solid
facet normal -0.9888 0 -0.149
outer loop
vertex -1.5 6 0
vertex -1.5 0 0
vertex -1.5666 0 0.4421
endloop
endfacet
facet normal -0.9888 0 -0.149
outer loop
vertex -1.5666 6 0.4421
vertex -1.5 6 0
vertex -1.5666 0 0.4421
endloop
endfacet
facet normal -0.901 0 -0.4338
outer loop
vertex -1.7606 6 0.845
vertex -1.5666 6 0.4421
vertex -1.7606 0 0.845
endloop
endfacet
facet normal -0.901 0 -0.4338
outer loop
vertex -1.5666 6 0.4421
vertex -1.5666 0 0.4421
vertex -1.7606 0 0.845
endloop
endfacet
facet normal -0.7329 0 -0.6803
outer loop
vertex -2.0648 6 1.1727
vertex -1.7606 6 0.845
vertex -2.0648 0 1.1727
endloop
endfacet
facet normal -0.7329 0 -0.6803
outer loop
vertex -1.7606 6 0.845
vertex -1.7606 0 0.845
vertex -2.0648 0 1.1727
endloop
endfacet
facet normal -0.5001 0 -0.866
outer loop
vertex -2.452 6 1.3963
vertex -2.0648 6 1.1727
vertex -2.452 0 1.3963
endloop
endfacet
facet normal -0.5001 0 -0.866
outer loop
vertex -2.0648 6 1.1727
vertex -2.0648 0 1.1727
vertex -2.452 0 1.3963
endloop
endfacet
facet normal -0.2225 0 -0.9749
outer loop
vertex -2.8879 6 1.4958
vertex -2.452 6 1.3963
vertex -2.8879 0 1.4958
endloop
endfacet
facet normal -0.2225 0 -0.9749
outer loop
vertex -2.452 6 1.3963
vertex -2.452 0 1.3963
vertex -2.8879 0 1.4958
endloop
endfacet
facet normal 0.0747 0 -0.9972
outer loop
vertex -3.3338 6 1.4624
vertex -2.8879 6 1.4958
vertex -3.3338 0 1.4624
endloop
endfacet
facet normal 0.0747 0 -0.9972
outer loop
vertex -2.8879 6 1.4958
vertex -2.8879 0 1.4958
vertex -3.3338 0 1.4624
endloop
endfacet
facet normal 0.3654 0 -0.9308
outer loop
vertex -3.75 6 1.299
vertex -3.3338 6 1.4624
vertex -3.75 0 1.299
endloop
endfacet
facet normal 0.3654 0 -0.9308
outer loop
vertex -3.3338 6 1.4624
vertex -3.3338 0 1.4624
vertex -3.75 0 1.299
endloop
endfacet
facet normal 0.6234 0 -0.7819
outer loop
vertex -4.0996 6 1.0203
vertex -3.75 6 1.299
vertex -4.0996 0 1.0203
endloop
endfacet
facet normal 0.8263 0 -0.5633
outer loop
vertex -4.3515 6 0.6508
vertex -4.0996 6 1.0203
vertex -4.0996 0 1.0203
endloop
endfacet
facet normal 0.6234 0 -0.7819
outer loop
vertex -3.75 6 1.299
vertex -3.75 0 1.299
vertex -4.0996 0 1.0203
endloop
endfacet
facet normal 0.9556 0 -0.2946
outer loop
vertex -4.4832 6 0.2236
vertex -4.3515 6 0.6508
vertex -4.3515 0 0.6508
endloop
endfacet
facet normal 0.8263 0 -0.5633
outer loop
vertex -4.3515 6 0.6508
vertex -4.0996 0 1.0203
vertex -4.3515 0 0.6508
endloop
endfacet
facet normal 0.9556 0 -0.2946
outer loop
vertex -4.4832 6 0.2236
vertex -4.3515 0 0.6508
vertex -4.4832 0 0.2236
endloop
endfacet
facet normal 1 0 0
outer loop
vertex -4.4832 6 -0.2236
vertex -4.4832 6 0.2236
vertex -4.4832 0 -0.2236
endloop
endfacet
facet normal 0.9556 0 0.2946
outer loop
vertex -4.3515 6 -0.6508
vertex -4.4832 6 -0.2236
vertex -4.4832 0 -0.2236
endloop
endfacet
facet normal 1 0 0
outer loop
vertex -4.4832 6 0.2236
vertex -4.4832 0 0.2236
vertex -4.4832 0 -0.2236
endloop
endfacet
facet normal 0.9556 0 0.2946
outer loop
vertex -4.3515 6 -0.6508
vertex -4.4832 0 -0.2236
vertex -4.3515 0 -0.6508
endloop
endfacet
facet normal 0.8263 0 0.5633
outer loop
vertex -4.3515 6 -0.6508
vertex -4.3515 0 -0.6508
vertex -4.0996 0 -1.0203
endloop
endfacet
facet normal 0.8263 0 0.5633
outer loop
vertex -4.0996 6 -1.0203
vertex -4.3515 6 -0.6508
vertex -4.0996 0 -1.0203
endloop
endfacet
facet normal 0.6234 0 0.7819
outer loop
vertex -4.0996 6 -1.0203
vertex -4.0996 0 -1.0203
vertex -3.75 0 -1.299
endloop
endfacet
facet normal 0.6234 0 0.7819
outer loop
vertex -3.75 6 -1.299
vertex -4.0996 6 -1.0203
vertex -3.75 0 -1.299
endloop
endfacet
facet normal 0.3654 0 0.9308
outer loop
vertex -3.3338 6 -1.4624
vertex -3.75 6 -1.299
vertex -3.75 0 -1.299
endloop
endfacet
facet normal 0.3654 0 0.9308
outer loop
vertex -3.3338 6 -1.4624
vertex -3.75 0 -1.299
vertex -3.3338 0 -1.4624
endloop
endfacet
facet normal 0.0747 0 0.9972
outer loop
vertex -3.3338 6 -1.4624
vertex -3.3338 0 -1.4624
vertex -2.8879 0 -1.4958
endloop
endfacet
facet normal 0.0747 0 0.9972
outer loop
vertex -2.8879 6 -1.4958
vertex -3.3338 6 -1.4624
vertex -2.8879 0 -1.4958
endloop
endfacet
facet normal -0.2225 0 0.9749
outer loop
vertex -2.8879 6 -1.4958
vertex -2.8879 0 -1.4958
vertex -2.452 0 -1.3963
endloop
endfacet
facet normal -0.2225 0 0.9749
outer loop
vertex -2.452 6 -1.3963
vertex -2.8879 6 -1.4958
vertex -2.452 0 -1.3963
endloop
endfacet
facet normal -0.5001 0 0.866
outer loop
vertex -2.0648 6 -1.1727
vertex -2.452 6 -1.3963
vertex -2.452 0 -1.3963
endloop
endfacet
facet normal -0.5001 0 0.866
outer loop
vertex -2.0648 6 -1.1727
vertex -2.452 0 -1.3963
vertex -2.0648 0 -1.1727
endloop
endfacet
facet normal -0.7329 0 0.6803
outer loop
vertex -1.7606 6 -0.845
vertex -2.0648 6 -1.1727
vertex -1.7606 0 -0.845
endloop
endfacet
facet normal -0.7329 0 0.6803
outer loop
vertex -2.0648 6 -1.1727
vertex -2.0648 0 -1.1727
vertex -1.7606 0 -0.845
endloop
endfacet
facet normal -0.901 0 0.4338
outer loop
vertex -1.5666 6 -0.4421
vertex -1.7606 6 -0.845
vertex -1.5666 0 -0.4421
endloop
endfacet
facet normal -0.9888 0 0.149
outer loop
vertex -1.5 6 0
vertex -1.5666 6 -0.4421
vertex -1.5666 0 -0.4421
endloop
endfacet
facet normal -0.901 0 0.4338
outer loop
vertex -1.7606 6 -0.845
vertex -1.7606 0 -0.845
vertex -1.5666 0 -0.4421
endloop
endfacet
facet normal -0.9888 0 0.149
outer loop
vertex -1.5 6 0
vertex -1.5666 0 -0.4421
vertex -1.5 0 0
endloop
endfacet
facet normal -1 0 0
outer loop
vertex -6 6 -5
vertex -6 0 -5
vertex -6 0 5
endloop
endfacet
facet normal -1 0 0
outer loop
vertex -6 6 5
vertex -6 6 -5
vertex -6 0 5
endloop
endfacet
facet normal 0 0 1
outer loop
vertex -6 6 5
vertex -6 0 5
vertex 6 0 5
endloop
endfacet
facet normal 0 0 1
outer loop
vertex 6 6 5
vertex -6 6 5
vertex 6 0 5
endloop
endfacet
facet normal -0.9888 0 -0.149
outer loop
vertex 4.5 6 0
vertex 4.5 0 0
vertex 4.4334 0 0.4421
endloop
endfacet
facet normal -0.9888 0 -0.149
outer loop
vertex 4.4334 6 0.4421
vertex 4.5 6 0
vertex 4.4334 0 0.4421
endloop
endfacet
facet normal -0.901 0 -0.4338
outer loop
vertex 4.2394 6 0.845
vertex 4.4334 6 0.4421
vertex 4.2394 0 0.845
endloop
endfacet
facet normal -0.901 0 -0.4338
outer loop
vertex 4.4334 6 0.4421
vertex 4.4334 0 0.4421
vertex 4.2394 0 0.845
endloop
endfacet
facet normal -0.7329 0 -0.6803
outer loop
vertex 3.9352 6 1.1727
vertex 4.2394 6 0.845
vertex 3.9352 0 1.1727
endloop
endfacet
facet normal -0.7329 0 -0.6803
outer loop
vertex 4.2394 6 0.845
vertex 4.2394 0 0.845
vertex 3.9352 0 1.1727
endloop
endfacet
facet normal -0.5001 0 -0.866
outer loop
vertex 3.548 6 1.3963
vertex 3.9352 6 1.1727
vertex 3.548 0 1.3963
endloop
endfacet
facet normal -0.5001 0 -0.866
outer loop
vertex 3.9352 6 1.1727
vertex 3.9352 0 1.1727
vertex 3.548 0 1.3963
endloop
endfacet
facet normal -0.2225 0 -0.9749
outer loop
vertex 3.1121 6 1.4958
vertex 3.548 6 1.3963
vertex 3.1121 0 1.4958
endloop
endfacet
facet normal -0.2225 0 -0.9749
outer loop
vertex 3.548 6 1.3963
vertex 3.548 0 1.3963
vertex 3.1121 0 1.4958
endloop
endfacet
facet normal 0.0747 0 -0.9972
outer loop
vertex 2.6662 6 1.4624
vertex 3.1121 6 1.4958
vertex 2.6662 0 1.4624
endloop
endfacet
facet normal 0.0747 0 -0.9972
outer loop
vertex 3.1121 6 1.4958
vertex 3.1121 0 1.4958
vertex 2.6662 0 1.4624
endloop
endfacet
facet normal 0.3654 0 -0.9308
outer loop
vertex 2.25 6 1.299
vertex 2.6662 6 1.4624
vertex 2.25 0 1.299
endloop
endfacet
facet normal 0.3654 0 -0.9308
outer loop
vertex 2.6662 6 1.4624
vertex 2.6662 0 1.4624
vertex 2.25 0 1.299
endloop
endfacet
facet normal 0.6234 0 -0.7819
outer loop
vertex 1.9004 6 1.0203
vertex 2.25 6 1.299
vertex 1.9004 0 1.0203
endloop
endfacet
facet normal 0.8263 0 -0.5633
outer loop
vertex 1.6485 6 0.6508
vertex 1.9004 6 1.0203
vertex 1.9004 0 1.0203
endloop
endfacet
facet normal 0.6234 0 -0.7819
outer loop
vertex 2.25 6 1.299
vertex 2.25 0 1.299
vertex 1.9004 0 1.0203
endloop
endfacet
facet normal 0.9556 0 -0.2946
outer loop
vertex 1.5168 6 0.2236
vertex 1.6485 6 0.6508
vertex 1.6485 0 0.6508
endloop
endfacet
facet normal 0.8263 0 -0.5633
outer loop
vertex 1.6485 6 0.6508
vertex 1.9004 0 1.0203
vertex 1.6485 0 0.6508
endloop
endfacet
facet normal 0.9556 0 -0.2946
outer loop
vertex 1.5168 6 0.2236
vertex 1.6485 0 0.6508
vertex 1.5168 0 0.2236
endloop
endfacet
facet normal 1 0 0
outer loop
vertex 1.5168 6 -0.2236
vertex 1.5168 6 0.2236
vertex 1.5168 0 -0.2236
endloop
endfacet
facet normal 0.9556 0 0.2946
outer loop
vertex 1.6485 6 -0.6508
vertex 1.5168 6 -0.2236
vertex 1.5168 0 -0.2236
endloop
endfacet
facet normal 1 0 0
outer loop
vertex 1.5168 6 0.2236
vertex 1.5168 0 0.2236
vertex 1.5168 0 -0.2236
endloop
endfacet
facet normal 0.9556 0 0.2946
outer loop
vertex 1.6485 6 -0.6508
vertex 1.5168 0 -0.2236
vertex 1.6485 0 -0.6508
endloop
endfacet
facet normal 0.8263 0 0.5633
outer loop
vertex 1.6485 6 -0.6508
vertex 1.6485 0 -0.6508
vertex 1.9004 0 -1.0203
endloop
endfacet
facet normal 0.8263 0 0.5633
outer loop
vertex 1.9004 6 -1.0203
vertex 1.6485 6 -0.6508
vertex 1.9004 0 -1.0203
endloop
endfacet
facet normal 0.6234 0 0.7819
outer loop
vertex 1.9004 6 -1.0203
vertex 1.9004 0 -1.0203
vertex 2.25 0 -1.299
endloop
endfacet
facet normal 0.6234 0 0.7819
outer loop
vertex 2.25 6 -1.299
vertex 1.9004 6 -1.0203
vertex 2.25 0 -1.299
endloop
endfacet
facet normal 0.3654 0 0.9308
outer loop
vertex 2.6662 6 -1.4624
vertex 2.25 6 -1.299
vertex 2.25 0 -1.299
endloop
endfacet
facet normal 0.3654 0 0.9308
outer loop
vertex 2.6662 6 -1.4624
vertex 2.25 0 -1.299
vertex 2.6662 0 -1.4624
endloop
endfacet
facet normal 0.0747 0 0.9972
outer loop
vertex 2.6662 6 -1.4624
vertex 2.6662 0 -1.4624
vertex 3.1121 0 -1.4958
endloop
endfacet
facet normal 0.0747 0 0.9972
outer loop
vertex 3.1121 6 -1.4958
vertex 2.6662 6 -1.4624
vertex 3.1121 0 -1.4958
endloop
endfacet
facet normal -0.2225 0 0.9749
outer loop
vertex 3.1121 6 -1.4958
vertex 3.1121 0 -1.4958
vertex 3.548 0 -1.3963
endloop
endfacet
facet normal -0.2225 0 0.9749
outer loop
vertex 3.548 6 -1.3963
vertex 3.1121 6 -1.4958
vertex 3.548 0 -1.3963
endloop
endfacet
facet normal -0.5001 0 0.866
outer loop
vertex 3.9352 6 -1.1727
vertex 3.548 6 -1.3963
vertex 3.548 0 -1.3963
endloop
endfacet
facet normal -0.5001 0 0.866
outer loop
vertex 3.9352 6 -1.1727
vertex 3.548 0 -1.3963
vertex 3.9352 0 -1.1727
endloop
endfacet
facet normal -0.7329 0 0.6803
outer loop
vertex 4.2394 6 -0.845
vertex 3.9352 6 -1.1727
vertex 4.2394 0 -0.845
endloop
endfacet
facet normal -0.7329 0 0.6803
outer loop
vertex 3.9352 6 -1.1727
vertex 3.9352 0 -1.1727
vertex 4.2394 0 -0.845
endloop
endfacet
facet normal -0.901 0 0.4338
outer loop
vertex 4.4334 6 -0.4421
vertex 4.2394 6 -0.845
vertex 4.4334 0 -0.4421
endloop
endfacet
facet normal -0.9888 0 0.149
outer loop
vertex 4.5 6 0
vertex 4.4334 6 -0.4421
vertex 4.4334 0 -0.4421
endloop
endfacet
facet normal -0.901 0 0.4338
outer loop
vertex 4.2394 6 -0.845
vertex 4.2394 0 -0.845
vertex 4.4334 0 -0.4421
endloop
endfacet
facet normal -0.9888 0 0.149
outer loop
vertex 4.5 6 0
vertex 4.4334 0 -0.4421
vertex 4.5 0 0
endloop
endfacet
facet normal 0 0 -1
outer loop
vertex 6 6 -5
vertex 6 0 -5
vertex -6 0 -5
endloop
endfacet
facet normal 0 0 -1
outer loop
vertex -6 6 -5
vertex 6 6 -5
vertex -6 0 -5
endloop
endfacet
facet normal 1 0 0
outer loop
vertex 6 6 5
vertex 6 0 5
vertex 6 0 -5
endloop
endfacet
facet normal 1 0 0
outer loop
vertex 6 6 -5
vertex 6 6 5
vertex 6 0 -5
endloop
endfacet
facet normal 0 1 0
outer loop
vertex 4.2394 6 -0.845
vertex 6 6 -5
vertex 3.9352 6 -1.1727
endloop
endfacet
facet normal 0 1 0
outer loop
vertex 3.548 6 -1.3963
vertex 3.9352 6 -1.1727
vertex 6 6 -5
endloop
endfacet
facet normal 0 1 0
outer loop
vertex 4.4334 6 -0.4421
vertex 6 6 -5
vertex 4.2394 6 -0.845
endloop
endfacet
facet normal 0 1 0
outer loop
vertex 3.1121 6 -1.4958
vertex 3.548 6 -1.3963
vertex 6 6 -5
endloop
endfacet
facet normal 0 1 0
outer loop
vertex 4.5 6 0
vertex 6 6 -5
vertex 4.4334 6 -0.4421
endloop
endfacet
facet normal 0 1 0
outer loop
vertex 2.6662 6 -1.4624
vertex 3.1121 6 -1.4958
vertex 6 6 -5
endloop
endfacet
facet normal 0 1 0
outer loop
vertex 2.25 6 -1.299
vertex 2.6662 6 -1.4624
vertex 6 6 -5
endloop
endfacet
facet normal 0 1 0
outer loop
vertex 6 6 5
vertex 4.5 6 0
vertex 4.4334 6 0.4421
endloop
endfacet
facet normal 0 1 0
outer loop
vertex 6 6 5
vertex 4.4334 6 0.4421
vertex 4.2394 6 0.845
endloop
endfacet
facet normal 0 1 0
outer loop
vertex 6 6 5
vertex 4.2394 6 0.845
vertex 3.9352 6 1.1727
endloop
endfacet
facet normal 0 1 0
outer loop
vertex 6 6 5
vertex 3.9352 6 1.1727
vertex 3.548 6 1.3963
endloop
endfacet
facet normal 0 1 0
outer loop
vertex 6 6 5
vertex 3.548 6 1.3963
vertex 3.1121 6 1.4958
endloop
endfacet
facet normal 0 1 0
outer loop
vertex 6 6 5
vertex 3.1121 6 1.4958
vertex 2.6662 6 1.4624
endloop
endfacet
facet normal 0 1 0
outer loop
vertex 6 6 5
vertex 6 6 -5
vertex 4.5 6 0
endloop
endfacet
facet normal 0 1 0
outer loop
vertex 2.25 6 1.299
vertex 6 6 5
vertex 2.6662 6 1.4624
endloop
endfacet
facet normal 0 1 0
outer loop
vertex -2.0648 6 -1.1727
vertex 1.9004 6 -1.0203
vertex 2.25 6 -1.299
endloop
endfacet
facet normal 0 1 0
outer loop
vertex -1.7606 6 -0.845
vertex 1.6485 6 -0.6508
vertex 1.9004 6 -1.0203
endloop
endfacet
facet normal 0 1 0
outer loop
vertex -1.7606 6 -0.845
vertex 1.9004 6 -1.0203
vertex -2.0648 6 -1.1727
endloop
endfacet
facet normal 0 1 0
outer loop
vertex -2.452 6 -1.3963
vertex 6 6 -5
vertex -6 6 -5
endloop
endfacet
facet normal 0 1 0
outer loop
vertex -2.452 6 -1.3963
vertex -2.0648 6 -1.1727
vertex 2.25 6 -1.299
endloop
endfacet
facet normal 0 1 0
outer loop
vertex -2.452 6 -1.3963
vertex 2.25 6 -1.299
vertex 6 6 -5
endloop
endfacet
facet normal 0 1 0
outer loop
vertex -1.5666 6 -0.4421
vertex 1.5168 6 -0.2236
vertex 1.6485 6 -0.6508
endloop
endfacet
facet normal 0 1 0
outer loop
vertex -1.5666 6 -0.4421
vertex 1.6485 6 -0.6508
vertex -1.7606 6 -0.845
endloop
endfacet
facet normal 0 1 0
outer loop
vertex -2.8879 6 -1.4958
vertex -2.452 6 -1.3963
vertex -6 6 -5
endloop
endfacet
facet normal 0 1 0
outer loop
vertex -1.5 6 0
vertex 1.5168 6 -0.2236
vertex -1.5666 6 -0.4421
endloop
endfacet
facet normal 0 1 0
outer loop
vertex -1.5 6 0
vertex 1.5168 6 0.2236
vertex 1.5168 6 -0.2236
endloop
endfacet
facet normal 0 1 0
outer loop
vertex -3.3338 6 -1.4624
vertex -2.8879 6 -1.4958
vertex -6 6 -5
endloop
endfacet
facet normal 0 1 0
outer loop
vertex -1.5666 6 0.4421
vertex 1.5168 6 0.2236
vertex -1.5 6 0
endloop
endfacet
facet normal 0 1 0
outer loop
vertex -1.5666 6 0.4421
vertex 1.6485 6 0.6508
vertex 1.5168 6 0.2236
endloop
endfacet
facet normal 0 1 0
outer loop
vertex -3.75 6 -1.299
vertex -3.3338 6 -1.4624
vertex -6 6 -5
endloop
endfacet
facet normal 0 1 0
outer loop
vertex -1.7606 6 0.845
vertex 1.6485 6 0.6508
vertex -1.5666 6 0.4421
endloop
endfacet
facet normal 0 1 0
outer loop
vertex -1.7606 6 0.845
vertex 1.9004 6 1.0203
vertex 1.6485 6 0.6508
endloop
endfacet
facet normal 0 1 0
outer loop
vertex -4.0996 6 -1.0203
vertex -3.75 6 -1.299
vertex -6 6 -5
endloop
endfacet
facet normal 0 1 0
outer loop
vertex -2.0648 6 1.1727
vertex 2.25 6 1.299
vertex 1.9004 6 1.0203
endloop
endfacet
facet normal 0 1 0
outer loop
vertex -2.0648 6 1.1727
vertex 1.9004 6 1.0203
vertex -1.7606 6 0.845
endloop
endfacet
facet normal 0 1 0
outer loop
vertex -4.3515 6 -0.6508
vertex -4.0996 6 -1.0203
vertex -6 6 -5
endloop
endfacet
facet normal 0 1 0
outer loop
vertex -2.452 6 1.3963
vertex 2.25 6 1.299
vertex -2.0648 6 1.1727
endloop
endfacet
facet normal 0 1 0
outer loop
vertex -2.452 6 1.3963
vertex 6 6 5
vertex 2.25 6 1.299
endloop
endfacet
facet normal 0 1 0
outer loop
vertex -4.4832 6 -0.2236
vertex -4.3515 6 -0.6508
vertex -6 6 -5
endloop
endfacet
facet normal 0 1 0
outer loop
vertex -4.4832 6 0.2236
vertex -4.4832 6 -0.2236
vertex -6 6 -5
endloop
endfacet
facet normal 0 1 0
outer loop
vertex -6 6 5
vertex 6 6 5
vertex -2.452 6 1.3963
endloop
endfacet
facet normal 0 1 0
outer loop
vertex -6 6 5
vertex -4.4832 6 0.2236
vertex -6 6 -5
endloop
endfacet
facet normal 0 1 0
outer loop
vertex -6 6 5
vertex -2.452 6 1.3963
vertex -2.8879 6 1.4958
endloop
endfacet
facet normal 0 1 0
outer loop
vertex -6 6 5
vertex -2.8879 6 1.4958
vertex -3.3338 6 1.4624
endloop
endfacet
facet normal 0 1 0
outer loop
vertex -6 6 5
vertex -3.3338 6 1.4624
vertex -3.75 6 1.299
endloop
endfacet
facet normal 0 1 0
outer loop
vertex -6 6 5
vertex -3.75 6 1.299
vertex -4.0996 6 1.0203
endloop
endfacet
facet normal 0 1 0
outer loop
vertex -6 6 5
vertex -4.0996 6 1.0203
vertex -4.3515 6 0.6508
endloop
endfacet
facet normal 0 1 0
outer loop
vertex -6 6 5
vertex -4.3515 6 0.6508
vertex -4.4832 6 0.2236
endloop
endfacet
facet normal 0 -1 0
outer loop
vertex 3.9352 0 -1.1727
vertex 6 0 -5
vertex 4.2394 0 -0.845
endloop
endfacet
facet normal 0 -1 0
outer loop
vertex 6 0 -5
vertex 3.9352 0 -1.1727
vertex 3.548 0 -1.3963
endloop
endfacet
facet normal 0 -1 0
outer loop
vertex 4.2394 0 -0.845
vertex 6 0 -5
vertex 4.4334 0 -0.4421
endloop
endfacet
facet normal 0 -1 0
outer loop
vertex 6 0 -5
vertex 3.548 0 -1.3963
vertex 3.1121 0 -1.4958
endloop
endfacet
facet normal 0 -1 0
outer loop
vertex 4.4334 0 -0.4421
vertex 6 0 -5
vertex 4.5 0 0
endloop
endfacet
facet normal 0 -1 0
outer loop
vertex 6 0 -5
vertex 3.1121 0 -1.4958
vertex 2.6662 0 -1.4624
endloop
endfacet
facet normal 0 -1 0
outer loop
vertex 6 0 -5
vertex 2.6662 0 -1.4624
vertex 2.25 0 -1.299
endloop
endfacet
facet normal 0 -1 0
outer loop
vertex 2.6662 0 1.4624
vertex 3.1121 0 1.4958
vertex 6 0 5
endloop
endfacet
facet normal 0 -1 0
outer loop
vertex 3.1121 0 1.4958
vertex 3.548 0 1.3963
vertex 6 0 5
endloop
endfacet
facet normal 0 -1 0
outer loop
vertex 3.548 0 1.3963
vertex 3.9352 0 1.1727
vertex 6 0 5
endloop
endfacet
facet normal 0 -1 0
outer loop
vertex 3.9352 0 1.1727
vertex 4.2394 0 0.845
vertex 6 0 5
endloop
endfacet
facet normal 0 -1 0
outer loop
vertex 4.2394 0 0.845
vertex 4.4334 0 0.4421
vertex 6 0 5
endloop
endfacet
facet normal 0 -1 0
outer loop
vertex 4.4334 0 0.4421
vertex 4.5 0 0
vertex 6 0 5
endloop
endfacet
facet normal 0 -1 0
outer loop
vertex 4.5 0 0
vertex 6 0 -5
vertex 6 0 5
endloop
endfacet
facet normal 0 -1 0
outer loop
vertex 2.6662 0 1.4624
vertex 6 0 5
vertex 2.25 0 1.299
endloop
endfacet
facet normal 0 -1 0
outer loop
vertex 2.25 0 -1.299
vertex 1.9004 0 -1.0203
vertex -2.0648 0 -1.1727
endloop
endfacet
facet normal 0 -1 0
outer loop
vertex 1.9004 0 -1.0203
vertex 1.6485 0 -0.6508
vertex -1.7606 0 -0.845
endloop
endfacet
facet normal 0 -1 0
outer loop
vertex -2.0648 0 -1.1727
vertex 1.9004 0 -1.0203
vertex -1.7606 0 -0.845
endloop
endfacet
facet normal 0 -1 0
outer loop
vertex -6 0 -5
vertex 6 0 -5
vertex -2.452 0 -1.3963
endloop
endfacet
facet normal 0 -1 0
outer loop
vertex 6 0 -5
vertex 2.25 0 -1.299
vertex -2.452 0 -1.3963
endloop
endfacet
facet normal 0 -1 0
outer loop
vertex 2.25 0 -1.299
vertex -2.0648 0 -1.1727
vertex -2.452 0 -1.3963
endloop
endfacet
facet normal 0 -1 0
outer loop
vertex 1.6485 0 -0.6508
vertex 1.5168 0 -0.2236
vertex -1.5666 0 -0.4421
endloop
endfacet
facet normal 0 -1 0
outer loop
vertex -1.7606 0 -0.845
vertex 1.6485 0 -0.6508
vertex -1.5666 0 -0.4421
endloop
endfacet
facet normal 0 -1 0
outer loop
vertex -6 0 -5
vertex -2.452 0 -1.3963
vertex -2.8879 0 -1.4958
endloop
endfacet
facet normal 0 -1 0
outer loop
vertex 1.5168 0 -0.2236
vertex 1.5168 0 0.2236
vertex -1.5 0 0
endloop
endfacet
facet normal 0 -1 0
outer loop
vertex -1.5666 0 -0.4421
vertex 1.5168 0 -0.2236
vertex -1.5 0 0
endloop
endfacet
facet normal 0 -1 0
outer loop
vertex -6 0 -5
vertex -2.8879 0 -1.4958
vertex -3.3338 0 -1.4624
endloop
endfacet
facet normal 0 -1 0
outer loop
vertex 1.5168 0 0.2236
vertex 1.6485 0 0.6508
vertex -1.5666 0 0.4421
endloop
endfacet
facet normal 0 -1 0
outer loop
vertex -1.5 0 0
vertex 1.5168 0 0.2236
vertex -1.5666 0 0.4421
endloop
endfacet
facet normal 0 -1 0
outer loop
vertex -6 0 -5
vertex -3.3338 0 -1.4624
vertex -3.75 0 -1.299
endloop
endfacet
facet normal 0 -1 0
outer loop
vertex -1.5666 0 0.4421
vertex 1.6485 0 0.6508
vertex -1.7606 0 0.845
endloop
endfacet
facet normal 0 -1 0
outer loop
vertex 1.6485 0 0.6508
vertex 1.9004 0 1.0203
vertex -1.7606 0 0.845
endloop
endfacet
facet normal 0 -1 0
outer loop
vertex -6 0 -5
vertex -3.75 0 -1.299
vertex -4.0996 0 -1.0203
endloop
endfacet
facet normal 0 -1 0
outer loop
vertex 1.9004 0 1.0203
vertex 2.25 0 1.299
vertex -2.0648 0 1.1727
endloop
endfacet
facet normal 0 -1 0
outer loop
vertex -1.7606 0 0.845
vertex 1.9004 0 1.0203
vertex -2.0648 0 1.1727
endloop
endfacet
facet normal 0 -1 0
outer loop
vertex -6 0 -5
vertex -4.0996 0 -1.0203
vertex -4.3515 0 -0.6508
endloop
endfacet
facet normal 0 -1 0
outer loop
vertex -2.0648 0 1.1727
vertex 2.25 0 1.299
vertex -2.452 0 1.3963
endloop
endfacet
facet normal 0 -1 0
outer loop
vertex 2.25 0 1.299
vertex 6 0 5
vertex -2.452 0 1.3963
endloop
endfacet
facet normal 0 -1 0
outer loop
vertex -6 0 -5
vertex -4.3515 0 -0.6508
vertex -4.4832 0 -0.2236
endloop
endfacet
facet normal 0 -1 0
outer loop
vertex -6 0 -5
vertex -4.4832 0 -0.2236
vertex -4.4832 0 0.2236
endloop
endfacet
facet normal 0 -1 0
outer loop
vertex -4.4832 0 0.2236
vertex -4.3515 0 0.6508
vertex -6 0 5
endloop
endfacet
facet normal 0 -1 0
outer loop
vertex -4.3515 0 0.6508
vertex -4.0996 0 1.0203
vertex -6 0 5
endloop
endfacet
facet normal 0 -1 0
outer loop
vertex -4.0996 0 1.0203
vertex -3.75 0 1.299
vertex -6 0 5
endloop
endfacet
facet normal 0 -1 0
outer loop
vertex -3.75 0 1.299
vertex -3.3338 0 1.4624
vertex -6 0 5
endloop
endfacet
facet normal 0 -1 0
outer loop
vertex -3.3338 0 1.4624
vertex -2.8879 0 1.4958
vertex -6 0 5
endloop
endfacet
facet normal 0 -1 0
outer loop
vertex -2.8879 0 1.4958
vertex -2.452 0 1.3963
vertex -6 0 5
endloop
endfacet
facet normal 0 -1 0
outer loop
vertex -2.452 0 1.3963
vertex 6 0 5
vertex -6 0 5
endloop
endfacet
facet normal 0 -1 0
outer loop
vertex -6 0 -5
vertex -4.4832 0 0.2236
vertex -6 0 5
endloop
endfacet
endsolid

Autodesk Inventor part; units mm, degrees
ref_plane "YZ Plane" through (0, 0, 0) normal (1, 0, 0) x (0, 1, 0)
ref_plane "XZ Plane" through (0, 0, 0) normal (0, 1, 0) x (-1, 0, 0)
ref_plane "XY Plane" through (0, 0, 0) normal (0, 0, 1) x (1, 0, 0)
sketch "Sketch1" plane through (0, 0, 0) normal (0, 1, 0) x (-1, 0, 0)
  line L0 (6, 5) -> (-6, 5)
  line L1 (-6, 5) -> (-6, -5)
  line L2 (-6, -5) -> (6, -5)
  line L3 (6, -5) -> (6, 5)
  line L4 (6, 5) -> (-6, -5) construction
  line L5 (-6, 5) -> (6, -5) construction
  point P0 (0, 0)
  dimension "d0" = 12
  dimension "d1" = 10
extrude "Extrusion1" add sketch "Sketch1" along normal blind 6
sketch "Sketch2" plane through (0, 6, 0) normal (0, 1, 0) x (1, 0, 0)
  line L0 (6, -5) -> (6, 5) projected
  line L1 (-6, 5) -> (-6, -5) projected
  line L2 (-6, 0) -> (-3, 0)
  line L3 (6, 0) -> (3, 0)
  circle A0 centre (-3, 0) radius 1.5
  circle A1 centre (3, 0) radius 1.5
  point P0 (0, 0)
  dimension "d4" = 3
  dimension "d5" = 3
  dimension "d6" = 3
  dimension "d7" = 3
extrude "Extrusion2" cut sketch "Sketch2" against normal blind 6
sketch "Sketch3" plane through (0, 0, 0) normal (0, -1, 0) x (1, 0, 0)
  circle A0 centre (-3, 0) radius 1.5 projected
  circle A1 centre (3, 0) radius 1.5 projected
  point P0 (0, 0)
extrude "Extrusion3" add sketch "Sketch3" against normal blind 6
sketch "Sketch4" plane through (0, 0, 0) normal (0, -1, 0) x (1, 0, 0)
  line L0 (-6, -5) -> (-6, 5) projected
  line L1 (6, 5) -> (6, -5) projected
  line L2 (-6, 0) -> (-3, 0)
  line L3 (-3, 0) -> (3, 0)
  circle A0 centre (3, 0) radius 1.5
  circle A1 centre (-3, 0) radius 1.5
  point P0 (0, 0)
  dimension "d12" = 3
  dimension "d13" = 6
  dimension "d14" = 3
  dimension "d15" = 3
extrude "Extrusion4" cut sketch "Sketch4" against normal blind 6
properties part number "kolejnicka_ruka_druha_cast"
